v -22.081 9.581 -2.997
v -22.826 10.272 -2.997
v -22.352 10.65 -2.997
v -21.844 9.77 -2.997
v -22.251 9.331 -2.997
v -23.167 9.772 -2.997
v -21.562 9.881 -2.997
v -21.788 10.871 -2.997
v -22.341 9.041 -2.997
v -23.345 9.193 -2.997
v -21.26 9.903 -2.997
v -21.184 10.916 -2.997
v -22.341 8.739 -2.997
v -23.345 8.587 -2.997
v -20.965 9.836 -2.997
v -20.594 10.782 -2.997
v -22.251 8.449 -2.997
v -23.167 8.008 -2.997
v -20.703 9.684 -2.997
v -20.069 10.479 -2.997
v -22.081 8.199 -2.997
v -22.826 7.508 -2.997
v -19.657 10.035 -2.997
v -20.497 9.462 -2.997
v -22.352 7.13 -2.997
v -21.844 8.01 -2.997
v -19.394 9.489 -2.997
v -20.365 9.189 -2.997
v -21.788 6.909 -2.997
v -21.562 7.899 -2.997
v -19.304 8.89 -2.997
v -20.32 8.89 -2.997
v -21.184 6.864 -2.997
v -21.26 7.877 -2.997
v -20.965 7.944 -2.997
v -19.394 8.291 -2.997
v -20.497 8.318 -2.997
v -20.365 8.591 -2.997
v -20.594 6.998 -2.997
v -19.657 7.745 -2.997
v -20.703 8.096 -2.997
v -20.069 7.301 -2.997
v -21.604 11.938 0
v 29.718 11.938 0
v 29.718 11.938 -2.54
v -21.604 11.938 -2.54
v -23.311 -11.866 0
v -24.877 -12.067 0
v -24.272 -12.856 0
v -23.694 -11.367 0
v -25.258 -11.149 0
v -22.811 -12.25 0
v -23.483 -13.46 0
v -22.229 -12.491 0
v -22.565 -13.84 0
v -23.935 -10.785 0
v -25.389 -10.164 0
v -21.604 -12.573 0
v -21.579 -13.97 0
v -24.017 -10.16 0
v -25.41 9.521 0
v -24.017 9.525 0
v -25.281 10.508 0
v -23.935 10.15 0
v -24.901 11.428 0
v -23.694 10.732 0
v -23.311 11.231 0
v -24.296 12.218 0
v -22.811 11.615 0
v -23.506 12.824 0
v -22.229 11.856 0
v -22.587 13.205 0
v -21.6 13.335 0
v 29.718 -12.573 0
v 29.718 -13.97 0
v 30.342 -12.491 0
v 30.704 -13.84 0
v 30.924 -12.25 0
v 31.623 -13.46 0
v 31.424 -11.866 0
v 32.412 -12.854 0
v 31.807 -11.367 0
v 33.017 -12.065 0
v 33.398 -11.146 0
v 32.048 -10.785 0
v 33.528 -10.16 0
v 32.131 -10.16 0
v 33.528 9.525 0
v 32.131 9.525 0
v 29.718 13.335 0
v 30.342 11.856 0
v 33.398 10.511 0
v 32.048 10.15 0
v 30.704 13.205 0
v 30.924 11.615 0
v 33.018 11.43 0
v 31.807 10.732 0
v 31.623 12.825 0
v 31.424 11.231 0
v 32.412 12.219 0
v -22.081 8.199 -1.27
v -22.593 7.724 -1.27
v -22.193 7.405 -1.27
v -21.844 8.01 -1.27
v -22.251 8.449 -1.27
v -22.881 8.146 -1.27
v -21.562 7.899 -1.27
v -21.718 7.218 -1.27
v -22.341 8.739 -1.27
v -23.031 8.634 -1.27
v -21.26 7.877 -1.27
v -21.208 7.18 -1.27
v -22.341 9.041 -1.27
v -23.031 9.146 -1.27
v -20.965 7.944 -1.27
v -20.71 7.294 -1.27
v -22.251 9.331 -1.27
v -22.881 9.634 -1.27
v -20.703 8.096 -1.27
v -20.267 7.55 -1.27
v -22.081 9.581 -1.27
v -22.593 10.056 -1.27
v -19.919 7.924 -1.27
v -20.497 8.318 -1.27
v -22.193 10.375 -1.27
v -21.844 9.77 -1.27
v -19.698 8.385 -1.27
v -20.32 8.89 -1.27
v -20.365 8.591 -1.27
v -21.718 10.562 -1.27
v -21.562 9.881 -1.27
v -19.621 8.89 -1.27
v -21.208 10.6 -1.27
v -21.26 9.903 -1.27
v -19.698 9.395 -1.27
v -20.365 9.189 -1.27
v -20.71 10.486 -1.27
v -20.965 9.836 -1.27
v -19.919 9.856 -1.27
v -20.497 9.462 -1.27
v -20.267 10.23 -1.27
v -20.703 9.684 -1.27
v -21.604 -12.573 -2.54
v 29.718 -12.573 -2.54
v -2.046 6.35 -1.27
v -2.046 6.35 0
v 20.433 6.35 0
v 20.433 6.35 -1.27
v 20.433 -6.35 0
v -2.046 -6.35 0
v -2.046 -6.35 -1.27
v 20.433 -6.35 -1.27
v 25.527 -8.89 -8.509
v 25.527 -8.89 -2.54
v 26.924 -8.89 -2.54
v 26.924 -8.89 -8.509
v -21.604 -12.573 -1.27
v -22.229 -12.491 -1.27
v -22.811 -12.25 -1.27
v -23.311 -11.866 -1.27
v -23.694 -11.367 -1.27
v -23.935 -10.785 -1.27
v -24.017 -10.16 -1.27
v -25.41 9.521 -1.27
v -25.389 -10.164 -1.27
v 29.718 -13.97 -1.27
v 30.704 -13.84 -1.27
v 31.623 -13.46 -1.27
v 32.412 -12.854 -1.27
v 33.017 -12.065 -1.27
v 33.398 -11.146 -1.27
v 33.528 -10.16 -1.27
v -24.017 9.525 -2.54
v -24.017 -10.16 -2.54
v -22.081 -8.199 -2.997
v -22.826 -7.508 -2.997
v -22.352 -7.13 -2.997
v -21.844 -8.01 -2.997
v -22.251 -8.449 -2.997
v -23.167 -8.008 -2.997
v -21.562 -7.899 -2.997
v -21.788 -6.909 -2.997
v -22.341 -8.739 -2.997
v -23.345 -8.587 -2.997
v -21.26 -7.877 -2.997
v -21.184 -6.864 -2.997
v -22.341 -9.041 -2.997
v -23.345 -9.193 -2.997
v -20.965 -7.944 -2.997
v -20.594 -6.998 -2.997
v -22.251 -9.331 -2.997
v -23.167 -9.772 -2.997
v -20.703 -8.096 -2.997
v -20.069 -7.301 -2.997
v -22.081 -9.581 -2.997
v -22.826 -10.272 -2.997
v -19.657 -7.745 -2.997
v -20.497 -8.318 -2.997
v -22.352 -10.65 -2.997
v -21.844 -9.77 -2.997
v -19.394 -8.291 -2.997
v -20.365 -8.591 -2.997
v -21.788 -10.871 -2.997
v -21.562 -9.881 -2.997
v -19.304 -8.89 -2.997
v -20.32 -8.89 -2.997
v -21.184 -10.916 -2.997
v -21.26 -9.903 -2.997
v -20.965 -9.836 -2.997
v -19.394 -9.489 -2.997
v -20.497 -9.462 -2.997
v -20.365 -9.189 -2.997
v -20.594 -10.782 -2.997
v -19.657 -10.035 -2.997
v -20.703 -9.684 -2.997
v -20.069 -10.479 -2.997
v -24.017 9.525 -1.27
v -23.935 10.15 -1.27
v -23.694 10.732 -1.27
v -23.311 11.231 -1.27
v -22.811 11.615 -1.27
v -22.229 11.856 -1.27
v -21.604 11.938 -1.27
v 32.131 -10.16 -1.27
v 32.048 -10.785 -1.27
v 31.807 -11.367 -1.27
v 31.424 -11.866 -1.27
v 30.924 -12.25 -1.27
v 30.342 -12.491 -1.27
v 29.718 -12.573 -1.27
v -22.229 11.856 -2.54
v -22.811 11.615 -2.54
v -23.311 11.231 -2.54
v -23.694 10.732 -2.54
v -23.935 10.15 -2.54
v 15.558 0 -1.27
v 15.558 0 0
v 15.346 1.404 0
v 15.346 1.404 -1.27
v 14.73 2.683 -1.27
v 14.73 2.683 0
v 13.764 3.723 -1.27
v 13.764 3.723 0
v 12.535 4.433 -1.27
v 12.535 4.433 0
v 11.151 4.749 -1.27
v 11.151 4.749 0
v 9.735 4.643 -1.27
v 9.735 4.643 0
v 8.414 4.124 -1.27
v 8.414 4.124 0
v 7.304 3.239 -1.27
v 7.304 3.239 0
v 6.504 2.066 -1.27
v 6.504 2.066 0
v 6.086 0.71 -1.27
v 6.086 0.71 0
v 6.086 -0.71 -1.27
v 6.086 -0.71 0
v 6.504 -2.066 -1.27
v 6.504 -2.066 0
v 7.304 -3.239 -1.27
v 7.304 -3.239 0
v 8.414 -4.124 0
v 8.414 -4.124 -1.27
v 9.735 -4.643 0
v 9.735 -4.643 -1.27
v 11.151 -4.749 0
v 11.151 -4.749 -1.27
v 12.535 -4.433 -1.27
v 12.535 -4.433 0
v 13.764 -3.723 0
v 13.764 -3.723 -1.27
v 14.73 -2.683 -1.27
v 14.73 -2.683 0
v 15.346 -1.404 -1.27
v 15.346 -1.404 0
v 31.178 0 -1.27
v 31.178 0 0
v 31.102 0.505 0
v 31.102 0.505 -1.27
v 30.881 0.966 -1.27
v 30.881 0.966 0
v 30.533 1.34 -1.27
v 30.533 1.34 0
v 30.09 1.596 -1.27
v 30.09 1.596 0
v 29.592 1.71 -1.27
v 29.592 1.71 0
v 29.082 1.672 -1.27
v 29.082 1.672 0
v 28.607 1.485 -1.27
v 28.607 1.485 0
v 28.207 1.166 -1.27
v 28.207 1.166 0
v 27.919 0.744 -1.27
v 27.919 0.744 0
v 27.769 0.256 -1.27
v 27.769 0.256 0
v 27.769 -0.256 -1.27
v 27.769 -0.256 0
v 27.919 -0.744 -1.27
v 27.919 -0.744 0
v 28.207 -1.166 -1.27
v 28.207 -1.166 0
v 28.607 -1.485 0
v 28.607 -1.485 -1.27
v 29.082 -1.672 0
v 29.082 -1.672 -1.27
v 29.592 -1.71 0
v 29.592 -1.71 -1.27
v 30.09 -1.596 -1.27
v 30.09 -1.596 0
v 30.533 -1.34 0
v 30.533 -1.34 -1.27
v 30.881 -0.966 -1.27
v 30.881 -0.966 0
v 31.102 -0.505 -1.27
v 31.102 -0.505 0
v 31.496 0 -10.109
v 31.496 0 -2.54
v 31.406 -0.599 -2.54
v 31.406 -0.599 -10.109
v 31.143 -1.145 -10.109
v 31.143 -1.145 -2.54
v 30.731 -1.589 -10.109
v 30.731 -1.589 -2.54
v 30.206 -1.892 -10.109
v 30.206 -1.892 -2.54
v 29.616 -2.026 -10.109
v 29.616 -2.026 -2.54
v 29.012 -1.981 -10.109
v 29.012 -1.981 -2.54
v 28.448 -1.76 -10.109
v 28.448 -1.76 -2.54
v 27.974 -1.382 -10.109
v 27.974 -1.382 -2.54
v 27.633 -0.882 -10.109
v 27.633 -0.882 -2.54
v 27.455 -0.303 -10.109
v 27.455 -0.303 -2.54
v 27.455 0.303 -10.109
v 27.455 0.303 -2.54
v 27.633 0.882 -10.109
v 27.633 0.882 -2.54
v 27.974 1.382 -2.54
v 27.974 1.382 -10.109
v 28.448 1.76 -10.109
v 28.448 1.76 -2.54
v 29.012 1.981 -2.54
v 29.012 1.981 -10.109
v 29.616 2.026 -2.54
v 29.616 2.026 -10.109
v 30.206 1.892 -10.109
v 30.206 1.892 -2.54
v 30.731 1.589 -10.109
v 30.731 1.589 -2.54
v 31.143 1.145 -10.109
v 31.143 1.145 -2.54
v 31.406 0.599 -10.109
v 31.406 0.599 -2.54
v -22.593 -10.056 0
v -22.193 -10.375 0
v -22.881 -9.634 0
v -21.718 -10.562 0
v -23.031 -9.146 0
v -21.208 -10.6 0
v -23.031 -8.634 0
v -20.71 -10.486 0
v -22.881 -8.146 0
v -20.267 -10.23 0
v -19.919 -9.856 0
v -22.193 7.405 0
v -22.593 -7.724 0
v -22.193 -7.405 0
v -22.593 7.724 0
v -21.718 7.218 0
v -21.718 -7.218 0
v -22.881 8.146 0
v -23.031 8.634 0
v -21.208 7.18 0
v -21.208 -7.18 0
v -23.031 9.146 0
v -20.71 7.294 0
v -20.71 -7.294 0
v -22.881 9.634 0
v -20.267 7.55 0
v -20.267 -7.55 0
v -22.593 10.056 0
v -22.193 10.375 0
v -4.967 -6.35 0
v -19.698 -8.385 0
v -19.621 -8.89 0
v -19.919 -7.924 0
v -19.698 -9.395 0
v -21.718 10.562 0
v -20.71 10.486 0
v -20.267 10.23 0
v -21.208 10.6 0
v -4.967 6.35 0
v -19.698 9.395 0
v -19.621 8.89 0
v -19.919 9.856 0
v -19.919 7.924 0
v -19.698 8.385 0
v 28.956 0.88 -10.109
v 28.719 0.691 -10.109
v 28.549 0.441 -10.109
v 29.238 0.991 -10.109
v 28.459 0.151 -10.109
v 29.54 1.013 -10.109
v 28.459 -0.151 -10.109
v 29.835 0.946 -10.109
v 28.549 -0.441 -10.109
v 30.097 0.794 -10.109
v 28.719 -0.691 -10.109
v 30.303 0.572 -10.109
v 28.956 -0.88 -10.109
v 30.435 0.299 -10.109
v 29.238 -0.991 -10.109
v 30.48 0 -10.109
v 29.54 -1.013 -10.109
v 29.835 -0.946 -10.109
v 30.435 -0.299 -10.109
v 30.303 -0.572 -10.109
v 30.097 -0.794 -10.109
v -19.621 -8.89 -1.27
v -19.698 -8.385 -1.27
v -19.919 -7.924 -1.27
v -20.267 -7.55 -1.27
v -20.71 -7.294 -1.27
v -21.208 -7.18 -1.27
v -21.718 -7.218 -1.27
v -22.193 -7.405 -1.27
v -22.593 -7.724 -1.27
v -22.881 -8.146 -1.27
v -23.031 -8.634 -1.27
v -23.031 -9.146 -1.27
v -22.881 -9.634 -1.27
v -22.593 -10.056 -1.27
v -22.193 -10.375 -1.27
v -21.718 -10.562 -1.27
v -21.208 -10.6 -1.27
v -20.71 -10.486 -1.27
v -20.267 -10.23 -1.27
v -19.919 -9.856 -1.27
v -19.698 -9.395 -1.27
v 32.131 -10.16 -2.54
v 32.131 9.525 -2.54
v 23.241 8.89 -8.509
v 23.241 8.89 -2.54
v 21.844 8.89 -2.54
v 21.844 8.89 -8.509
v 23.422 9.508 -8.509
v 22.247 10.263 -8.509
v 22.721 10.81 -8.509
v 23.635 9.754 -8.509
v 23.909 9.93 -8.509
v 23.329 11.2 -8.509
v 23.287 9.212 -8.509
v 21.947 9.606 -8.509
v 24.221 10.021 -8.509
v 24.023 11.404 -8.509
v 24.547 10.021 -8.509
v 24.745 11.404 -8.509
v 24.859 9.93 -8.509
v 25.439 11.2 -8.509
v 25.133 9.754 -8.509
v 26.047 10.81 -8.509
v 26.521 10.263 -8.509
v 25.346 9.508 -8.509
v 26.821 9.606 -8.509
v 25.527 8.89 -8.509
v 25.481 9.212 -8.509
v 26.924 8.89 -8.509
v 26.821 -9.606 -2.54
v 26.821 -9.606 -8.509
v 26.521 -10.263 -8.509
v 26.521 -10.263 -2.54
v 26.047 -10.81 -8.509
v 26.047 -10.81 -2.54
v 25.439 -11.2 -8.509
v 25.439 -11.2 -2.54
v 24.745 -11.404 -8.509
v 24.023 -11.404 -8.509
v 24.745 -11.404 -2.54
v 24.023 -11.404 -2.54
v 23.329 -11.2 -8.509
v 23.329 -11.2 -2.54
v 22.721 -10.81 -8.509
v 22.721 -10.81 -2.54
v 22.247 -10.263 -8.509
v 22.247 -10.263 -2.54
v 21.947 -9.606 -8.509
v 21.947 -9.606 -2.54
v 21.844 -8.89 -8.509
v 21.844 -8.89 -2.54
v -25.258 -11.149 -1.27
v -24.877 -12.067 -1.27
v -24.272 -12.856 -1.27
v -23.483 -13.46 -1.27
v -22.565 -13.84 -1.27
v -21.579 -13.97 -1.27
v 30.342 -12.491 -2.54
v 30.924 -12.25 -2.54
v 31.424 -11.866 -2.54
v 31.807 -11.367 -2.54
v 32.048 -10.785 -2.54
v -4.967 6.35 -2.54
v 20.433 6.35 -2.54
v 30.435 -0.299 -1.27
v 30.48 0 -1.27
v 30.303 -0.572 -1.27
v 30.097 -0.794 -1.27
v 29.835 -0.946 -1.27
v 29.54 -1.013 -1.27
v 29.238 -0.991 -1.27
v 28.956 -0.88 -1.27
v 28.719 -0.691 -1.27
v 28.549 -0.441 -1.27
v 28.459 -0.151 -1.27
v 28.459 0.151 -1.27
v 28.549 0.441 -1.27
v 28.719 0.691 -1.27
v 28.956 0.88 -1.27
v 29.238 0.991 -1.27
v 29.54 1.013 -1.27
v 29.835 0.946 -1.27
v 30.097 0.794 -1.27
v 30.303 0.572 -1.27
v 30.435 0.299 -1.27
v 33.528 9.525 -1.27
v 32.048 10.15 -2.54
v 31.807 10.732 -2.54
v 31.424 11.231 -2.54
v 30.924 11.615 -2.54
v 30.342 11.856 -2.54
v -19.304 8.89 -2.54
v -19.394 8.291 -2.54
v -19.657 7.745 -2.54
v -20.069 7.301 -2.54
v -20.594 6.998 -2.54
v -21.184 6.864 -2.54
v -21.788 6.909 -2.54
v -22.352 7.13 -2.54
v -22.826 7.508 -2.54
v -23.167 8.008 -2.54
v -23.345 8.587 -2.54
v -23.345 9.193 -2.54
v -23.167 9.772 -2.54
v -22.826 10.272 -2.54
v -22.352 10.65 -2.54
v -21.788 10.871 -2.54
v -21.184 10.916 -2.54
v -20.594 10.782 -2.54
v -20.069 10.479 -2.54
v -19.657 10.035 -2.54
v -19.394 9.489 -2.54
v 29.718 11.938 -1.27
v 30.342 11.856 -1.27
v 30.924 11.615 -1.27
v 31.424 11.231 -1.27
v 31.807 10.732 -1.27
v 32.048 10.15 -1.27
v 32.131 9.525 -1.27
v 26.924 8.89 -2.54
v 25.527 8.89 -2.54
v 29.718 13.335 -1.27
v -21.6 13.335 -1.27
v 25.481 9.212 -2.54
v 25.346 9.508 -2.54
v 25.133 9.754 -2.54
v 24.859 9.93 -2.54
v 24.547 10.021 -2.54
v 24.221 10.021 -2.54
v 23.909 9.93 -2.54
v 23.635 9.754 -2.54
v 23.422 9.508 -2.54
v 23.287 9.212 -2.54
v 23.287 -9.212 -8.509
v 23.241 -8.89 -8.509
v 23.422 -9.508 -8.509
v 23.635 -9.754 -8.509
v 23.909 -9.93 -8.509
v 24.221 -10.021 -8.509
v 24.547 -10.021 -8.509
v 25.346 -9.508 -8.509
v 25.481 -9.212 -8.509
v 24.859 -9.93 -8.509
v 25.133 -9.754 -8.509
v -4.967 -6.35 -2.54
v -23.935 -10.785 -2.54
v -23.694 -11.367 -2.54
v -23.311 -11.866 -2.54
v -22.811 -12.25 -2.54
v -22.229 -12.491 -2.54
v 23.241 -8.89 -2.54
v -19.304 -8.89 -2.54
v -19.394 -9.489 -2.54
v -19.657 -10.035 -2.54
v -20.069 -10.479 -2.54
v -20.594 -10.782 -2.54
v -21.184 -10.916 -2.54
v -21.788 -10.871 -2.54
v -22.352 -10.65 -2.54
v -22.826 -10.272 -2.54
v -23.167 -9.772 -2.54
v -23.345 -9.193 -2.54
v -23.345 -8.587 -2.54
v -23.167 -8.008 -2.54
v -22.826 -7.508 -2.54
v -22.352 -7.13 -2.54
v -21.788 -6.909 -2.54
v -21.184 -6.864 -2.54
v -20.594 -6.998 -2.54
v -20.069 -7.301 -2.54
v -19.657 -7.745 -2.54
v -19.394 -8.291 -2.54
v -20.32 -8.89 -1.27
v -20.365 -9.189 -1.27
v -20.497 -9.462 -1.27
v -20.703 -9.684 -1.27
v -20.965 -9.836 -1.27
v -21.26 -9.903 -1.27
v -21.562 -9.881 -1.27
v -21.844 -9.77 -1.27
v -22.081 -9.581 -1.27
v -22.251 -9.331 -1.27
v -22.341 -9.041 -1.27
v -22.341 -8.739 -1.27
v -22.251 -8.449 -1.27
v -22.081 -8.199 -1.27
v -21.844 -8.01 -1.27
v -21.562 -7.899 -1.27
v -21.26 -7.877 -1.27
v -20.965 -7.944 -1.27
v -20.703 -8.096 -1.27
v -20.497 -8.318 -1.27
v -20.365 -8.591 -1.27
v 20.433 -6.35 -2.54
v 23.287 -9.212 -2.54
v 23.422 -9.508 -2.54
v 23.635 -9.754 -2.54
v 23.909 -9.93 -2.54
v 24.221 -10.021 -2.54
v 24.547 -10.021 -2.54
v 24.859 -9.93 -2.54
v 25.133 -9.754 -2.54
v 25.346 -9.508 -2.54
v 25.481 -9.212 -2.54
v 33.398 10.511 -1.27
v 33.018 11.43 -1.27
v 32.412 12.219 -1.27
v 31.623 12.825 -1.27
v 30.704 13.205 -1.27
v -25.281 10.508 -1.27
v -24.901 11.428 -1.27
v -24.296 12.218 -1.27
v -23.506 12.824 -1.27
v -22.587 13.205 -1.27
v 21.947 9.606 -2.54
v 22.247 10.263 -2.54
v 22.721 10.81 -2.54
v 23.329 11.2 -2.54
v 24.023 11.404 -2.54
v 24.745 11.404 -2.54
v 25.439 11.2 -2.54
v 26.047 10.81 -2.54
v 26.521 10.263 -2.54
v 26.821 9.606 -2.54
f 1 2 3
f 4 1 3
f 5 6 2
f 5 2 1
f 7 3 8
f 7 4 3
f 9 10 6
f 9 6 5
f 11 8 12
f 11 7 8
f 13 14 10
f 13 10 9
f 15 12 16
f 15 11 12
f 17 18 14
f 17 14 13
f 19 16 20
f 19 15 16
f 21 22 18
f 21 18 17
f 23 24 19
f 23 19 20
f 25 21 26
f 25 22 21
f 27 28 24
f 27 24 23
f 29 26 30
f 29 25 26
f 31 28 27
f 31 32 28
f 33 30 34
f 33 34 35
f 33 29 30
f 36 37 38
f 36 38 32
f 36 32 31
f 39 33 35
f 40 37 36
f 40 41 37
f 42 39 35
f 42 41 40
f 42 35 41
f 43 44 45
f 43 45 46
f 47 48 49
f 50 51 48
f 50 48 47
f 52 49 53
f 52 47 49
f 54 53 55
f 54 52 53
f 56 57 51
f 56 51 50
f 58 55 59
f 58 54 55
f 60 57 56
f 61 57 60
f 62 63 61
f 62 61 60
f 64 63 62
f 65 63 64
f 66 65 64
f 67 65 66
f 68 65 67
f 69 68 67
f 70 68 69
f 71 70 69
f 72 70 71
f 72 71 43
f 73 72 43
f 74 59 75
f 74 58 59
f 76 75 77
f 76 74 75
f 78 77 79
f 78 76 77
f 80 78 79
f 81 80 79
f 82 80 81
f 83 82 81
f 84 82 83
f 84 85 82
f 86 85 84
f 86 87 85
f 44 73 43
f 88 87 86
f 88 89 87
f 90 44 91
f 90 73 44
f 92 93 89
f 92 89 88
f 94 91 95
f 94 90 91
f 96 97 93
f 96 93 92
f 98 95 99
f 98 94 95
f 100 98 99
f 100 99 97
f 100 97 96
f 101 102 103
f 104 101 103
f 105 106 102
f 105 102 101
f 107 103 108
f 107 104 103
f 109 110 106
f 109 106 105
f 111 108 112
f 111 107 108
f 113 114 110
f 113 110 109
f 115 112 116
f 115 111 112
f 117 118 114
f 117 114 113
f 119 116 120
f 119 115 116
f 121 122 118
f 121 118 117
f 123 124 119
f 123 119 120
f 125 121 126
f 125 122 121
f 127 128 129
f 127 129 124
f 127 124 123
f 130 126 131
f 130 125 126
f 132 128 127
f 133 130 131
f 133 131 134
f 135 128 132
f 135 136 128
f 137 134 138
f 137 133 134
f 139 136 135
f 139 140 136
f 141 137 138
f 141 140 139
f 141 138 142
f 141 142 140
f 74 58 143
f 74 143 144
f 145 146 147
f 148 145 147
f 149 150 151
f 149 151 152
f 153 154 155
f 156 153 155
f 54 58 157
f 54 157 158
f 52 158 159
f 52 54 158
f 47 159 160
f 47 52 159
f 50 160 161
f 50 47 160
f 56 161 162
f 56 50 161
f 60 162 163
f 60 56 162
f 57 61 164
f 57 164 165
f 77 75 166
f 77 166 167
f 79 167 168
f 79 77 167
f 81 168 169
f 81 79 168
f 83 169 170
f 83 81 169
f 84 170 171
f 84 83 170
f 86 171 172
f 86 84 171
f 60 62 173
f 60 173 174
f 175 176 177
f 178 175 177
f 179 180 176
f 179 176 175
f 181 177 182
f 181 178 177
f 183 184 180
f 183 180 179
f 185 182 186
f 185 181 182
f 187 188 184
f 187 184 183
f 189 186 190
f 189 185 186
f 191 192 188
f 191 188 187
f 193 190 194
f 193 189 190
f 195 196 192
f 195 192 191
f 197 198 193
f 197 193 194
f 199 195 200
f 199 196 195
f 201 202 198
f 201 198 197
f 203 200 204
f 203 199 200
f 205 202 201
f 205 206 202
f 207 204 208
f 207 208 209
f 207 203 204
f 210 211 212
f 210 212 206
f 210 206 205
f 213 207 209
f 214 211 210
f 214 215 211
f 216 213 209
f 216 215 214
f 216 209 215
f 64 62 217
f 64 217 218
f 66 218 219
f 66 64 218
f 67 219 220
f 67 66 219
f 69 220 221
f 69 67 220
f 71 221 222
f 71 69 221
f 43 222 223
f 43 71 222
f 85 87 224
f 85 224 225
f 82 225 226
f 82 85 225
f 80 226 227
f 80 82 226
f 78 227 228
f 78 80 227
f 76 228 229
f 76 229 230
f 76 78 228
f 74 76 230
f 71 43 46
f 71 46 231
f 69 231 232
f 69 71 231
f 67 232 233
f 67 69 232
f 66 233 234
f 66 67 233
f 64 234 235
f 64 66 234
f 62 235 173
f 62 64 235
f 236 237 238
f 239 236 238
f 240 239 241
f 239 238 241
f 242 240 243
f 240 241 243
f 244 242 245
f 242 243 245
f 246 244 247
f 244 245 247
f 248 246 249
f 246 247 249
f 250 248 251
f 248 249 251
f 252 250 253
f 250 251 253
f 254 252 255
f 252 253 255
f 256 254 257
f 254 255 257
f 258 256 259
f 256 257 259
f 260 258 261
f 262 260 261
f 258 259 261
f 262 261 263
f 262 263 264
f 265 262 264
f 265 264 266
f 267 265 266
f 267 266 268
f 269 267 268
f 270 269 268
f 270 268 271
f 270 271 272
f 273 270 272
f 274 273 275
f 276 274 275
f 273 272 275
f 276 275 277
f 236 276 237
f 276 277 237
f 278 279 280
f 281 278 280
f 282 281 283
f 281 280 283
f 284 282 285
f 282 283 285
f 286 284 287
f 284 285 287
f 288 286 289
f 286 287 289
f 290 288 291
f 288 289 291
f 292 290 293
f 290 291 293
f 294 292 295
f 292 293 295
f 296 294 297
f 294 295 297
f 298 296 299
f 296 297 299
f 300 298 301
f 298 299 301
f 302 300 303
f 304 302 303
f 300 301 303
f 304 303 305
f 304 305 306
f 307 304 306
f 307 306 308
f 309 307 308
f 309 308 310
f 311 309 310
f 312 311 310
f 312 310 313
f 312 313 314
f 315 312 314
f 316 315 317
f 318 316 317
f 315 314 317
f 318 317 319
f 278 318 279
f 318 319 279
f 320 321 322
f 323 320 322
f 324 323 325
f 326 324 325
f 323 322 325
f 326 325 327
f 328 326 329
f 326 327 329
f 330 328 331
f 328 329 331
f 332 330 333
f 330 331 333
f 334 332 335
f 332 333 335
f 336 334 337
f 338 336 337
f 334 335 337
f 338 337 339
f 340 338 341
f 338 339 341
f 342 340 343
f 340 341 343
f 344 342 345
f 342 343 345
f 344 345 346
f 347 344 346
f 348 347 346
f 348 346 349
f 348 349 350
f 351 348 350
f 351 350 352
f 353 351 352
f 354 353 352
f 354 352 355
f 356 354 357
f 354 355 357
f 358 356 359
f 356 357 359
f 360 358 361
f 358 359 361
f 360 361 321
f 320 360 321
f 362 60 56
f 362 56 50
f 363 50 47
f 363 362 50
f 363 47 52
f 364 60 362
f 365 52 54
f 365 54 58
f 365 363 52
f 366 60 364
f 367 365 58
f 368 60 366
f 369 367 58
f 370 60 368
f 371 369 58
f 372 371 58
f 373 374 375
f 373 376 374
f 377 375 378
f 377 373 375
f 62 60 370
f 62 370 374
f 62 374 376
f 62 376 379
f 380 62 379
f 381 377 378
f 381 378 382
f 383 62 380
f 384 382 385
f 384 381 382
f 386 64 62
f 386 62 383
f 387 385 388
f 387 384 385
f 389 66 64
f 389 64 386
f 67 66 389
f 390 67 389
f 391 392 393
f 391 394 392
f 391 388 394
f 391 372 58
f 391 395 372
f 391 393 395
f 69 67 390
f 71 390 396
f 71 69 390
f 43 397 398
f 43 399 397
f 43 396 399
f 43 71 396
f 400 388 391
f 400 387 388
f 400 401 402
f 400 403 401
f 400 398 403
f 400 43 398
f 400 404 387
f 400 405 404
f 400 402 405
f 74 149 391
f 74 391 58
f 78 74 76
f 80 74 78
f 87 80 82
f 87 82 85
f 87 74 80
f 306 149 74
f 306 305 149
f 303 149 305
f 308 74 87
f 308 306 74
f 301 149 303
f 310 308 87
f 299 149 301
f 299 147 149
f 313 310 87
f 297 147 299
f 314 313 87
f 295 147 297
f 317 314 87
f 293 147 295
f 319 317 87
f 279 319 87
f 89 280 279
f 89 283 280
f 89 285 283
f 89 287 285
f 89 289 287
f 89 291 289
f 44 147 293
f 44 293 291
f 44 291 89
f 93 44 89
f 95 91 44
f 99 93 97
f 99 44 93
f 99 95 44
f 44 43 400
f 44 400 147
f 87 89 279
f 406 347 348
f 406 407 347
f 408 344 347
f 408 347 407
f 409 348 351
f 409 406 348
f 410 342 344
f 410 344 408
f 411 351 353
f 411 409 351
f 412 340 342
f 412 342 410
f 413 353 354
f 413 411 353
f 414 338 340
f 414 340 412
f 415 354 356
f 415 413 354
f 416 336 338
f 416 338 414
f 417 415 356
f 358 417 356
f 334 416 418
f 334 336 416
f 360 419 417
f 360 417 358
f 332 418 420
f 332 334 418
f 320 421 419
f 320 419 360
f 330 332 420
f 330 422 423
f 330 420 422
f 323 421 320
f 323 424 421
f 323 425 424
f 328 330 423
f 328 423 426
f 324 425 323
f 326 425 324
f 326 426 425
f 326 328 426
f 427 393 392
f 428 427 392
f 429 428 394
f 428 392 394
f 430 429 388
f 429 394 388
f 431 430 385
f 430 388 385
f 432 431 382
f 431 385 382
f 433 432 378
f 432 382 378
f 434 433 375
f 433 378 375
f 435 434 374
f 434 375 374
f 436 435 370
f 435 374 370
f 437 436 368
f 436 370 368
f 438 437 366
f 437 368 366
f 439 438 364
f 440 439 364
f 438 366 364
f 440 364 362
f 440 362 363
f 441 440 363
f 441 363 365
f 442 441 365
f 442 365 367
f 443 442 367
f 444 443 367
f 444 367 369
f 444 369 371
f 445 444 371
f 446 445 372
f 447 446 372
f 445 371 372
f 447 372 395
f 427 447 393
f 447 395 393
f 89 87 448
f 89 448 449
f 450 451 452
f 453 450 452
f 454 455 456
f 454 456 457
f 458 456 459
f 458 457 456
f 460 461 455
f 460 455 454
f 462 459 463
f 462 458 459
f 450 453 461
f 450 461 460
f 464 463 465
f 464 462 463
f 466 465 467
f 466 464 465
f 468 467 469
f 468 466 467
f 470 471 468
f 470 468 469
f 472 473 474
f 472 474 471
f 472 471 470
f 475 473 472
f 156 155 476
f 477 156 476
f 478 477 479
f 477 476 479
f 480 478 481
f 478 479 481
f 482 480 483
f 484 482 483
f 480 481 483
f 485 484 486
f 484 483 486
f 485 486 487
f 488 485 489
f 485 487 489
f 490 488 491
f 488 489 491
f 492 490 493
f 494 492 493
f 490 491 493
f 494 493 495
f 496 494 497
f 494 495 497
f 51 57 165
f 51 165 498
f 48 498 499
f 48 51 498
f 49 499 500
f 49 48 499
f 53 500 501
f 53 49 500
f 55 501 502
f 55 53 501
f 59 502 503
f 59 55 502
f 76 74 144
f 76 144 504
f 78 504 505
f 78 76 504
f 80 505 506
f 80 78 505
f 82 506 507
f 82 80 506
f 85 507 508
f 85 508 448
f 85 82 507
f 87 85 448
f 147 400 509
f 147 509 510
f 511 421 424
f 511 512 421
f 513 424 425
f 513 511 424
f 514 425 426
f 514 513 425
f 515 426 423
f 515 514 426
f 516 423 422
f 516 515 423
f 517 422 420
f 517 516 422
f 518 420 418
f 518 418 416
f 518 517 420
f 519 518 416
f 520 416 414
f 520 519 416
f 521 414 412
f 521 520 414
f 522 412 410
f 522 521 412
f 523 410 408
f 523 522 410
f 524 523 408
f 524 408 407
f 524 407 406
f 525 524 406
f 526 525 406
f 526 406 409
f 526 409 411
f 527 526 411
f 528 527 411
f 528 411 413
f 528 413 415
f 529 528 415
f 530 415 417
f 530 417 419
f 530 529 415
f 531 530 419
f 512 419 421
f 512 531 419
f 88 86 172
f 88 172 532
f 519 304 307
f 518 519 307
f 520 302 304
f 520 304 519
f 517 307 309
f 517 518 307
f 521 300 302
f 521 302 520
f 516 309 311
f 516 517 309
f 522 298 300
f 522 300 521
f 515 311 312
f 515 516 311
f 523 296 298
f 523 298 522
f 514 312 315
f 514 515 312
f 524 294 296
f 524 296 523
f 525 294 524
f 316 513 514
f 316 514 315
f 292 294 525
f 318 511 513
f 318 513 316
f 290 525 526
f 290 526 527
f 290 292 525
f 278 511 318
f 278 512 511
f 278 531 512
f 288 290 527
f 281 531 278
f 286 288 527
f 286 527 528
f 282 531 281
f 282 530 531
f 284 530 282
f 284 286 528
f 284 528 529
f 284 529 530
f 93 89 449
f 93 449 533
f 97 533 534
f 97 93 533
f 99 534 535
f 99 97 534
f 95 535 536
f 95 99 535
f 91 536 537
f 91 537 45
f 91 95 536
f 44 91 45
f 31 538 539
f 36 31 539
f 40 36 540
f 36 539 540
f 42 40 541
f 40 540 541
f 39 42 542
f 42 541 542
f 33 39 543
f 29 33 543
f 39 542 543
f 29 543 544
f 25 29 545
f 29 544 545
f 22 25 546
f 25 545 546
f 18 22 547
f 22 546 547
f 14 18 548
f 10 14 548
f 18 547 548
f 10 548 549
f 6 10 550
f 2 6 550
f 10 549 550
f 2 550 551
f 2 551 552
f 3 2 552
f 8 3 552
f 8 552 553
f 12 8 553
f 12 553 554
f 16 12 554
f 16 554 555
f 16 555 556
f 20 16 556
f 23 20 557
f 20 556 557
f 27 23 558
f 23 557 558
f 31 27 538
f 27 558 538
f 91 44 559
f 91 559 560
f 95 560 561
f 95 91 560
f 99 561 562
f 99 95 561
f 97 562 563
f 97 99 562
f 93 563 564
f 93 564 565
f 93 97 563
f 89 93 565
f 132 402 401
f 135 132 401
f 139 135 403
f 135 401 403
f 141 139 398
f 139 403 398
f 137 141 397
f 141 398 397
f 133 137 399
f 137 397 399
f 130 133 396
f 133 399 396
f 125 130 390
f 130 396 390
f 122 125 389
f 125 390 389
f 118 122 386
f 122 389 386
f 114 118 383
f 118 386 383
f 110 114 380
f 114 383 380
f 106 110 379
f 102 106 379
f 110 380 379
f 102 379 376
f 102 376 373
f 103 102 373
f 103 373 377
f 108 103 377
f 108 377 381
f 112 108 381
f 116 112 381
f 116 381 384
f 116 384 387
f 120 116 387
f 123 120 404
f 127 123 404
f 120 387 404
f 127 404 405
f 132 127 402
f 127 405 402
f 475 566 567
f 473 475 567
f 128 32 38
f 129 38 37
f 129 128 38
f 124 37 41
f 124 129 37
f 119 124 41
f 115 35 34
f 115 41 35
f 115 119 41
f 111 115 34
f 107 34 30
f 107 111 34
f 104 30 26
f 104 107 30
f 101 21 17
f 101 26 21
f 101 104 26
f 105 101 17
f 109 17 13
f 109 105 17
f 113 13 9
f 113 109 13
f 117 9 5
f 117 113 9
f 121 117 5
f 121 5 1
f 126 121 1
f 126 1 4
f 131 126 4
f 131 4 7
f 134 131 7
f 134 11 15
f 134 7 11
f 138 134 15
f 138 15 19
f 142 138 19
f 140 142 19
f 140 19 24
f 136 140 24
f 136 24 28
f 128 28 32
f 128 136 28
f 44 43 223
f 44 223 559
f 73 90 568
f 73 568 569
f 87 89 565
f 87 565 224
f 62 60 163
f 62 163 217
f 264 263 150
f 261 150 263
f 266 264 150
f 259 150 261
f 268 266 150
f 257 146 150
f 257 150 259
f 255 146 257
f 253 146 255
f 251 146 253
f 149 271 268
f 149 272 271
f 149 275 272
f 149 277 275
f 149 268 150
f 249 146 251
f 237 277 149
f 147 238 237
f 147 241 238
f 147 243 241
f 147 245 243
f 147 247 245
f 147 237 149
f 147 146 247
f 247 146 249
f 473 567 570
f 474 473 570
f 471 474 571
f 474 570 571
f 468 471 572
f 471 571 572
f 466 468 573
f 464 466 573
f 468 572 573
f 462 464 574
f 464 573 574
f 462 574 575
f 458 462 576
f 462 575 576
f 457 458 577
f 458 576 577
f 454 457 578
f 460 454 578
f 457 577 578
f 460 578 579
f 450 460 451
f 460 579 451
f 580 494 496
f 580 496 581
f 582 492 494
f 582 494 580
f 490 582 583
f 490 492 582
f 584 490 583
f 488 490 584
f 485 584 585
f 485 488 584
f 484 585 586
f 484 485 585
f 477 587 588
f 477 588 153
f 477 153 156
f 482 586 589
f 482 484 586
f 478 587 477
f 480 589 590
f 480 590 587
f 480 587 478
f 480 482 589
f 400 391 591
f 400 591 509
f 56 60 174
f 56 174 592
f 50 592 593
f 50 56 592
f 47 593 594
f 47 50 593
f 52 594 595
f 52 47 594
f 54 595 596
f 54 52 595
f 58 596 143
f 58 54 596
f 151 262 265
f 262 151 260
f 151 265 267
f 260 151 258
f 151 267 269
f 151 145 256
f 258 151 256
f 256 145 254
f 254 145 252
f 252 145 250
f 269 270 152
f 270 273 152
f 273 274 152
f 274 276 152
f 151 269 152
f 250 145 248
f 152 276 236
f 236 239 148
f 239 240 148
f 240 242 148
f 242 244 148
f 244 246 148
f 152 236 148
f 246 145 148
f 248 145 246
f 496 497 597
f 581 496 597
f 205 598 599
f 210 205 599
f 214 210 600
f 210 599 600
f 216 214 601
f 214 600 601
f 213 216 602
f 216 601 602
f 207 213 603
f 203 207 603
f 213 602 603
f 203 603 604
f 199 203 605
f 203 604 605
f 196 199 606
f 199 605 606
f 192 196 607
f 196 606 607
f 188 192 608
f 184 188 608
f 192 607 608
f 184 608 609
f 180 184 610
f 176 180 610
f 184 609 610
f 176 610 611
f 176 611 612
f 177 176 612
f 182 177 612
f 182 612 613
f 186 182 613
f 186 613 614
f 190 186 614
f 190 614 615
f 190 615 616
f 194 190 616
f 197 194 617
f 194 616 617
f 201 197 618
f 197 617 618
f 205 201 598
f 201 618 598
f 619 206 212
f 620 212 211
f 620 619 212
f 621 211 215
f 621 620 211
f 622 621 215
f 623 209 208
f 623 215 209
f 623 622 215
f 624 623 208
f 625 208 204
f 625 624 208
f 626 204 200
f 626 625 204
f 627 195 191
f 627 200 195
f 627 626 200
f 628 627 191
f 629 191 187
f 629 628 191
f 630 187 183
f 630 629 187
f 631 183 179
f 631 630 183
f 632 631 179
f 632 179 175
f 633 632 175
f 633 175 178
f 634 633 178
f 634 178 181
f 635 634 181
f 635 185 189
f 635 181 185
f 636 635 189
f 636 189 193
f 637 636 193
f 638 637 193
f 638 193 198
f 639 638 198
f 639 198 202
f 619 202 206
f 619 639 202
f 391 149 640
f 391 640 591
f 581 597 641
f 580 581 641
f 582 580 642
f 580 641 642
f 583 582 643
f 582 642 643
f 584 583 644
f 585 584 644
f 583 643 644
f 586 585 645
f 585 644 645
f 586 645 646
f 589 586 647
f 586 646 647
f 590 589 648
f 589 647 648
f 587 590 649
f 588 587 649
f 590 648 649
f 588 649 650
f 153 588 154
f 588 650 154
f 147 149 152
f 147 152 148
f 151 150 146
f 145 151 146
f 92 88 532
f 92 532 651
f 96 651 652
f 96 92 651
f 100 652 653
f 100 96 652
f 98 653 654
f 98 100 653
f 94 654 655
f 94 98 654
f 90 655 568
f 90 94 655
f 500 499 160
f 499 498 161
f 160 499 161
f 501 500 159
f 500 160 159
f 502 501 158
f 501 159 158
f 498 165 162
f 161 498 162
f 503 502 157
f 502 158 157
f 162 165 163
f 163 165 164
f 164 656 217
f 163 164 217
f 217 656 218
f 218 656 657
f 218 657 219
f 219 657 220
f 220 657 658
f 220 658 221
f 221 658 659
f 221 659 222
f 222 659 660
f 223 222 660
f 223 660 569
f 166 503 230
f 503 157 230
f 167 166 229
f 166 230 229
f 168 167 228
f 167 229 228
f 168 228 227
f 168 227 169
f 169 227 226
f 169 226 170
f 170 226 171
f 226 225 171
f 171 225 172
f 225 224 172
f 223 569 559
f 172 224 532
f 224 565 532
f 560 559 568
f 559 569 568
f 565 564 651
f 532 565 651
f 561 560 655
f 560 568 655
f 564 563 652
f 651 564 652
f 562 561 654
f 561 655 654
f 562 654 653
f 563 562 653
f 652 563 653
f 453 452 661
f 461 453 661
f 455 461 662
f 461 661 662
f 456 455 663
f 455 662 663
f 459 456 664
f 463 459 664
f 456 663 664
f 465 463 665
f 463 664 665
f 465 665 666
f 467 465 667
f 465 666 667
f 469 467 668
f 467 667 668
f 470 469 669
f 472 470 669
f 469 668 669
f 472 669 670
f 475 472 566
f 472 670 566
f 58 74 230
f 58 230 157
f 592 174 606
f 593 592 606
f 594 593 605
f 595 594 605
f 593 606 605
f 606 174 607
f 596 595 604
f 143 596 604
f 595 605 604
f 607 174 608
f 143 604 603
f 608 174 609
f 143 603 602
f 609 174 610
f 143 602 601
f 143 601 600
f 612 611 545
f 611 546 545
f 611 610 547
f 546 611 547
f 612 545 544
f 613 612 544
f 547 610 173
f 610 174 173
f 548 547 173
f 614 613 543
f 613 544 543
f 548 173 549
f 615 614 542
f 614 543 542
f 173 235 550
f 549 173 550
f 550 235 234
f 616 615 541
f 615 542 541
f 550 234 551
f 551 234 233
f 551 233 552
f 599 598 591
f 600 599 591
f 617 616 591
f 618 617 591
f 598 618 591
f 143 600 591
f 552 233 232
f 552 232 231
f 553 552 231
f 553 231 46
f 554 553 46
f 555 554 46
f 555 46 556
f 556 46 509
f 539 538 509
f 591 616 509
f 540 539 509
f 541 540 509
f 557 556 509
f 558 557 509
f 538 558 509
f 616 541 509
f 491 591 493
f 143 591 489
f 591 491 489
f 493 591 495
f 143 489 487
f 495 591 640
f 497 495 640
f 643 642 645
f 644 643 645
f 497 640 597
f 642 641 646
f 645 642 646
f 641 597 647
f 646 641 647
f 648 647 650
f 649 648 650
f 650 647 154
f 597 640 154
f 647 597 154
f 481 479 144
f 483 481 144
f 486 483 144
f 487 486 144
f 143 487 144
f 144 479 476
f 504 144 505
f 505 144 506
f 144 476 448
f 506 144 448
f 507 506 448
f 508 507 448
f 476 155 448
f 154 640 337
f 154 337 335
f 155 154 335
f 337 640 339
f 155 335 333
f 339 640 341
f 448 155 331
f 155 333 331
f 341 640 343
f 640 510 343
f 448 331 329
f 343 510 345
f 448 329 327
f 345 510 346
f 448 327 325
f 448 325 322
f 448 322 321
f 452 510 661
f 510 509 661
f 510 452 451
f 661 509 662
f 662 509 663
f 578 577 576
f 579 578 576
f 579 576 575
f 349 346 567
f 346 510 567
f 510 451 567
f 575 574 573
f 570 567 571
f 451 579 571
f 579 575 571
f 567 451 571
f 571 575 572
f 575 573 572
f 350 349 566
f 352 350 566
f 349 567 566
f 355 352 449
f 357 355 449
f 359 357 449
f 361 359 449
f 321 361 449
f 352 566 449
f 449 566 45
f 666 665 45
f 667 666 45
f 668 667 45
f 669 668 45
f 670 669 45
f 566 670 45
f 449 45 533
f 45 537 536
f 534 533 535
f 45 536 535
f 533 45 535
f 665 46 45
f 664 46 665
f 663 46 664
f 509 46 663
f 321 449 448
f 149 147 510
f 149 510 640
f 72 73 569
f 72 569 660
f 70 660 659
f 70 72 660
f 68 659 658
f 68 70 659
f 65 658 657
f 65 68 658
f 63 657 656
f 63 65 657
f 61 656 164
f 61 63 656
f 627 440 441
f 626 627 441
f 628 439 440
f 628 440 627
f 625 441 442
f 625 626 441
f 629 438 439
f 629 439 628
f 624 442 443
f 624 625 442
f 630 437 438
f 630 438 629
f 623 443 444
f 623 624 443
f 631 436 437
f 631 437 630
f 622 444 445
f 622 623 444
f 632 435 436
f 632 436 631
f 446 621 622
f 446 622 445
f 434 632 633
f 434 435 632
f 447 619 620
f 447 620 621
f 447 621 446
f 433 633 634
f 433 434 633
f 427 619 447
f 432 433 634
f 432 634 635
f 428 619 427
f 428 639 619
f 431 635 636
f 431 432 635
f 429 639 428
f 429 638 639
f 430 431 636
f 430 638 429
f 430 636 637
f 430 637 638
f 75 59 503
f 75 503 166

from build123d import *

# Parameters (mm, degrees)
F1_DEPTH  = 2.54
F0_W      = 22.479
F0_H      = 12.7
F0_R      = 4.7625
F2_DEPTH  = 1.27
F3_DEPTH  = 1.27
F4_R      = 2.032
F5_DEPTH  = 0.4572
F6_DEPTH  = 5.969
F7_R      = 1.7145
F8_DEPTH  = 1.27
F9_R      = 1.016
F10_DEPTH = 5.969
F11_R     = 2.032
F11_R_2   = 1.016
F12_DEPTH = 7.5692


with BuildPart() as f1:
    # F0 (on Top) → F1 (new body)
    with BuildSketch(Plane.XY):
        with BuildLine():
            Line((29.717637, 11.938), (-21.604332, 11.938))
            ThreePointArc((-21.604332, 11.938), (-23.310581, 11.231249), (-24.017332, 9.525))
            Line((-24.017332, 9.525), (-24.017332, -10.16))
            ThreePointArc((-24.017332, -10.16), (-23.310581, -11.866249), (-21.604332, -12.573))
            Line((-21.604332, -12.573), (29.717637, -12.573))
            ThreePointArc((29.717637, -12.573), (31.423886, -11.866249), (32.130637, -10.16))
            Line((32.130637, -10.16), (32.130637, 9.525))
            ThreePointArc((32.130637, 9.525), (31.423886, 11.231249), (29.717637, 11.938))
        make_face()
        Polygon((20.432668, 6.35), (20.432668, -6.35), (-2.046332, -6.35), (-4.967332, -6.35), (-4.967332, 6.35), (-2.046332, 6.35), align=None, mode=Mode.SUBTRACT)
    extrude(amount=-F1_DEPTH)

    # F4 (on face) → F5 (join)
    with BuildSketch(Plane(origin=(0, 0, -2.54), x_dir=(1, 0, 0), z_dir=(0, 0, -1))):
        with Locations((-21.336, 8.89)):
            Circle(F4_R)
        with Locations((-21.336, -8.89)):
            Circle(F4_R)
    extrude(amount=F5_DEPTH)

    # F4 (on face) → F6 (join)
    with BuildSketch(Plane(origin=(0, 0, -2.54), x_dir=(1, 0, 0), z_dir=(0, 0, -1))):
        with BuildLine():
            ThreePointArc((23.241, 8.89), (24.384, 10.033), (25.527, 8.89))
            Line((25.527, 8.89), (26.924, 8.89))
            ThreePointArc((26.924, 8.89), (24.384, 11.43), (21.844, 8.89))
            Line((21.844, 8.89), (23.241, 8.89))
        make_face()
        with BuildLine():
            Line((26.924, -8.89), (25.527, -8.89))
            ThreePointArc((25.527, -8.89), (24.384, -10.033), (23.241, -8.89))
            Line((23.241, -8.89), (21.844, -8.89))
            ThreePointArc((21.844, -8.89), (24.384, -11.43), (26.924, -8.89))
        make_face()
    extrude(amount=F6_DEPTH)

    # F7 (on face) → F8 (cut)
    with BuildSketch(Plane.XY):
        with Locations((-21.336, 8.89)):
            Circle(F7_R)
        with Locations((-21.336, -8.89)):
            Circle(F7_R)
        with Locations((29.464, 0)):
            Circle(F7_R)
    extrude(amount=-F8_DEPTH, mode=Mode.SUBTRACT)

    # F9 (on face) → F10 (cut)
    with BuildSketch(Plane(origin=(0, 0, -1.27), x_dir=(1, 0, 0), z_dir=(0, 0, -1))):
        with Locations((-21.336, 8.89)):
            Circle(F9_R)
        with Locations((-21.336, -8.89)):
            Circle(F9_R)
        with Locations((29.464, 0)):
            Circle(F9_R)
    extrude(amount=F10_DEPTH, mode=Mode.SUBTRACT)

    # F11 (on face) → F12 (join)
    with BuildSketch(Plane(origin=(0, 0, -2.54), x_dir=(1, 0, 0), z_dir=(0, 0, -1))):
        with Locations((29.464, 0)):
            Circle(F11_R)
        with Locations((29.464, 0)):
            Circle(F11_R_2, mode=Mode.SUBTRACT)
    extrude(amount=F12_DEPTH)


with BuildPart() as f2:
    # F0 (on Top) → F2 (new body)
    with BuildSketch(Plane.XY):
        with Locations((9.193168, 0)):
            Rectangle(F0_W, F0_H)
        with Locations((10.795, 0)):
            Circle(F0_R, mode=Mode.SUBTRACT)
    extrude(amount=-F2_DEPTH)


with BuildPart() as f3:
    # F0 (on Top) → F3 (new body)
    with BuildSketch(Plane.XY):
        with BuildLine():
            Line((-21.579105, -13.97), (29.717736, -13.97))
            ThreePointArc((29.717736, -13.97), (32.411778, -12.854112), (33.527736, -10.160099))
            Line((33.527736, -10.160099), (33.528247, 9.524901))
            ThreePointArc((33.528247, 9.524901), (32.412359, 12.219042), (29.718247, 13.335))
            Line((29.718247, 13.335), (-21.600239, 13.335))
            ThreePointArc((-21.600239, 13.335), (-24.295762, 12.21763), (-25.410237, 9.52091))
            Line((-25.410237, 9.52091), (-25.389103, -10.16409))
            ThreePointArc((-25.389103, -10.16409), (-24.271736, -12.855523), (-21.579105, -13.97))
        make_face()
        with BuildLine():
            ThreePointArc((-24.017332, 9.525), (-23.310581, 11.231249), (-21.604332, 11.938))
            Line((-21.604332, 11.938), (29.717637, 11.938))
            ThreePointArc((29.717637, 11.938), (31.423886, 11.231249), (32.130637, 9.525))
            Line((32.130637, 9.525), (32.130637, -10.16))
            ThreePointArc((32.130637, -10.16), (31.423886, -11.866249), (29.717637, -12.573))
            Line((29.717637, -12.573), (-21.604332, -12.573))
            ThreePointArc((-21.604332, -12.573), (-23.310581, -11.866249), (-24.017332, -10.16))
            Line((-24.017332, -10.16), (-24.017332, 9.525))
        make_face(mode=Mode.SUBTRACT)
    extrude(amount=-F3_DEPTH)


solid = Compound([f1.part, f2.part, f3.part])
